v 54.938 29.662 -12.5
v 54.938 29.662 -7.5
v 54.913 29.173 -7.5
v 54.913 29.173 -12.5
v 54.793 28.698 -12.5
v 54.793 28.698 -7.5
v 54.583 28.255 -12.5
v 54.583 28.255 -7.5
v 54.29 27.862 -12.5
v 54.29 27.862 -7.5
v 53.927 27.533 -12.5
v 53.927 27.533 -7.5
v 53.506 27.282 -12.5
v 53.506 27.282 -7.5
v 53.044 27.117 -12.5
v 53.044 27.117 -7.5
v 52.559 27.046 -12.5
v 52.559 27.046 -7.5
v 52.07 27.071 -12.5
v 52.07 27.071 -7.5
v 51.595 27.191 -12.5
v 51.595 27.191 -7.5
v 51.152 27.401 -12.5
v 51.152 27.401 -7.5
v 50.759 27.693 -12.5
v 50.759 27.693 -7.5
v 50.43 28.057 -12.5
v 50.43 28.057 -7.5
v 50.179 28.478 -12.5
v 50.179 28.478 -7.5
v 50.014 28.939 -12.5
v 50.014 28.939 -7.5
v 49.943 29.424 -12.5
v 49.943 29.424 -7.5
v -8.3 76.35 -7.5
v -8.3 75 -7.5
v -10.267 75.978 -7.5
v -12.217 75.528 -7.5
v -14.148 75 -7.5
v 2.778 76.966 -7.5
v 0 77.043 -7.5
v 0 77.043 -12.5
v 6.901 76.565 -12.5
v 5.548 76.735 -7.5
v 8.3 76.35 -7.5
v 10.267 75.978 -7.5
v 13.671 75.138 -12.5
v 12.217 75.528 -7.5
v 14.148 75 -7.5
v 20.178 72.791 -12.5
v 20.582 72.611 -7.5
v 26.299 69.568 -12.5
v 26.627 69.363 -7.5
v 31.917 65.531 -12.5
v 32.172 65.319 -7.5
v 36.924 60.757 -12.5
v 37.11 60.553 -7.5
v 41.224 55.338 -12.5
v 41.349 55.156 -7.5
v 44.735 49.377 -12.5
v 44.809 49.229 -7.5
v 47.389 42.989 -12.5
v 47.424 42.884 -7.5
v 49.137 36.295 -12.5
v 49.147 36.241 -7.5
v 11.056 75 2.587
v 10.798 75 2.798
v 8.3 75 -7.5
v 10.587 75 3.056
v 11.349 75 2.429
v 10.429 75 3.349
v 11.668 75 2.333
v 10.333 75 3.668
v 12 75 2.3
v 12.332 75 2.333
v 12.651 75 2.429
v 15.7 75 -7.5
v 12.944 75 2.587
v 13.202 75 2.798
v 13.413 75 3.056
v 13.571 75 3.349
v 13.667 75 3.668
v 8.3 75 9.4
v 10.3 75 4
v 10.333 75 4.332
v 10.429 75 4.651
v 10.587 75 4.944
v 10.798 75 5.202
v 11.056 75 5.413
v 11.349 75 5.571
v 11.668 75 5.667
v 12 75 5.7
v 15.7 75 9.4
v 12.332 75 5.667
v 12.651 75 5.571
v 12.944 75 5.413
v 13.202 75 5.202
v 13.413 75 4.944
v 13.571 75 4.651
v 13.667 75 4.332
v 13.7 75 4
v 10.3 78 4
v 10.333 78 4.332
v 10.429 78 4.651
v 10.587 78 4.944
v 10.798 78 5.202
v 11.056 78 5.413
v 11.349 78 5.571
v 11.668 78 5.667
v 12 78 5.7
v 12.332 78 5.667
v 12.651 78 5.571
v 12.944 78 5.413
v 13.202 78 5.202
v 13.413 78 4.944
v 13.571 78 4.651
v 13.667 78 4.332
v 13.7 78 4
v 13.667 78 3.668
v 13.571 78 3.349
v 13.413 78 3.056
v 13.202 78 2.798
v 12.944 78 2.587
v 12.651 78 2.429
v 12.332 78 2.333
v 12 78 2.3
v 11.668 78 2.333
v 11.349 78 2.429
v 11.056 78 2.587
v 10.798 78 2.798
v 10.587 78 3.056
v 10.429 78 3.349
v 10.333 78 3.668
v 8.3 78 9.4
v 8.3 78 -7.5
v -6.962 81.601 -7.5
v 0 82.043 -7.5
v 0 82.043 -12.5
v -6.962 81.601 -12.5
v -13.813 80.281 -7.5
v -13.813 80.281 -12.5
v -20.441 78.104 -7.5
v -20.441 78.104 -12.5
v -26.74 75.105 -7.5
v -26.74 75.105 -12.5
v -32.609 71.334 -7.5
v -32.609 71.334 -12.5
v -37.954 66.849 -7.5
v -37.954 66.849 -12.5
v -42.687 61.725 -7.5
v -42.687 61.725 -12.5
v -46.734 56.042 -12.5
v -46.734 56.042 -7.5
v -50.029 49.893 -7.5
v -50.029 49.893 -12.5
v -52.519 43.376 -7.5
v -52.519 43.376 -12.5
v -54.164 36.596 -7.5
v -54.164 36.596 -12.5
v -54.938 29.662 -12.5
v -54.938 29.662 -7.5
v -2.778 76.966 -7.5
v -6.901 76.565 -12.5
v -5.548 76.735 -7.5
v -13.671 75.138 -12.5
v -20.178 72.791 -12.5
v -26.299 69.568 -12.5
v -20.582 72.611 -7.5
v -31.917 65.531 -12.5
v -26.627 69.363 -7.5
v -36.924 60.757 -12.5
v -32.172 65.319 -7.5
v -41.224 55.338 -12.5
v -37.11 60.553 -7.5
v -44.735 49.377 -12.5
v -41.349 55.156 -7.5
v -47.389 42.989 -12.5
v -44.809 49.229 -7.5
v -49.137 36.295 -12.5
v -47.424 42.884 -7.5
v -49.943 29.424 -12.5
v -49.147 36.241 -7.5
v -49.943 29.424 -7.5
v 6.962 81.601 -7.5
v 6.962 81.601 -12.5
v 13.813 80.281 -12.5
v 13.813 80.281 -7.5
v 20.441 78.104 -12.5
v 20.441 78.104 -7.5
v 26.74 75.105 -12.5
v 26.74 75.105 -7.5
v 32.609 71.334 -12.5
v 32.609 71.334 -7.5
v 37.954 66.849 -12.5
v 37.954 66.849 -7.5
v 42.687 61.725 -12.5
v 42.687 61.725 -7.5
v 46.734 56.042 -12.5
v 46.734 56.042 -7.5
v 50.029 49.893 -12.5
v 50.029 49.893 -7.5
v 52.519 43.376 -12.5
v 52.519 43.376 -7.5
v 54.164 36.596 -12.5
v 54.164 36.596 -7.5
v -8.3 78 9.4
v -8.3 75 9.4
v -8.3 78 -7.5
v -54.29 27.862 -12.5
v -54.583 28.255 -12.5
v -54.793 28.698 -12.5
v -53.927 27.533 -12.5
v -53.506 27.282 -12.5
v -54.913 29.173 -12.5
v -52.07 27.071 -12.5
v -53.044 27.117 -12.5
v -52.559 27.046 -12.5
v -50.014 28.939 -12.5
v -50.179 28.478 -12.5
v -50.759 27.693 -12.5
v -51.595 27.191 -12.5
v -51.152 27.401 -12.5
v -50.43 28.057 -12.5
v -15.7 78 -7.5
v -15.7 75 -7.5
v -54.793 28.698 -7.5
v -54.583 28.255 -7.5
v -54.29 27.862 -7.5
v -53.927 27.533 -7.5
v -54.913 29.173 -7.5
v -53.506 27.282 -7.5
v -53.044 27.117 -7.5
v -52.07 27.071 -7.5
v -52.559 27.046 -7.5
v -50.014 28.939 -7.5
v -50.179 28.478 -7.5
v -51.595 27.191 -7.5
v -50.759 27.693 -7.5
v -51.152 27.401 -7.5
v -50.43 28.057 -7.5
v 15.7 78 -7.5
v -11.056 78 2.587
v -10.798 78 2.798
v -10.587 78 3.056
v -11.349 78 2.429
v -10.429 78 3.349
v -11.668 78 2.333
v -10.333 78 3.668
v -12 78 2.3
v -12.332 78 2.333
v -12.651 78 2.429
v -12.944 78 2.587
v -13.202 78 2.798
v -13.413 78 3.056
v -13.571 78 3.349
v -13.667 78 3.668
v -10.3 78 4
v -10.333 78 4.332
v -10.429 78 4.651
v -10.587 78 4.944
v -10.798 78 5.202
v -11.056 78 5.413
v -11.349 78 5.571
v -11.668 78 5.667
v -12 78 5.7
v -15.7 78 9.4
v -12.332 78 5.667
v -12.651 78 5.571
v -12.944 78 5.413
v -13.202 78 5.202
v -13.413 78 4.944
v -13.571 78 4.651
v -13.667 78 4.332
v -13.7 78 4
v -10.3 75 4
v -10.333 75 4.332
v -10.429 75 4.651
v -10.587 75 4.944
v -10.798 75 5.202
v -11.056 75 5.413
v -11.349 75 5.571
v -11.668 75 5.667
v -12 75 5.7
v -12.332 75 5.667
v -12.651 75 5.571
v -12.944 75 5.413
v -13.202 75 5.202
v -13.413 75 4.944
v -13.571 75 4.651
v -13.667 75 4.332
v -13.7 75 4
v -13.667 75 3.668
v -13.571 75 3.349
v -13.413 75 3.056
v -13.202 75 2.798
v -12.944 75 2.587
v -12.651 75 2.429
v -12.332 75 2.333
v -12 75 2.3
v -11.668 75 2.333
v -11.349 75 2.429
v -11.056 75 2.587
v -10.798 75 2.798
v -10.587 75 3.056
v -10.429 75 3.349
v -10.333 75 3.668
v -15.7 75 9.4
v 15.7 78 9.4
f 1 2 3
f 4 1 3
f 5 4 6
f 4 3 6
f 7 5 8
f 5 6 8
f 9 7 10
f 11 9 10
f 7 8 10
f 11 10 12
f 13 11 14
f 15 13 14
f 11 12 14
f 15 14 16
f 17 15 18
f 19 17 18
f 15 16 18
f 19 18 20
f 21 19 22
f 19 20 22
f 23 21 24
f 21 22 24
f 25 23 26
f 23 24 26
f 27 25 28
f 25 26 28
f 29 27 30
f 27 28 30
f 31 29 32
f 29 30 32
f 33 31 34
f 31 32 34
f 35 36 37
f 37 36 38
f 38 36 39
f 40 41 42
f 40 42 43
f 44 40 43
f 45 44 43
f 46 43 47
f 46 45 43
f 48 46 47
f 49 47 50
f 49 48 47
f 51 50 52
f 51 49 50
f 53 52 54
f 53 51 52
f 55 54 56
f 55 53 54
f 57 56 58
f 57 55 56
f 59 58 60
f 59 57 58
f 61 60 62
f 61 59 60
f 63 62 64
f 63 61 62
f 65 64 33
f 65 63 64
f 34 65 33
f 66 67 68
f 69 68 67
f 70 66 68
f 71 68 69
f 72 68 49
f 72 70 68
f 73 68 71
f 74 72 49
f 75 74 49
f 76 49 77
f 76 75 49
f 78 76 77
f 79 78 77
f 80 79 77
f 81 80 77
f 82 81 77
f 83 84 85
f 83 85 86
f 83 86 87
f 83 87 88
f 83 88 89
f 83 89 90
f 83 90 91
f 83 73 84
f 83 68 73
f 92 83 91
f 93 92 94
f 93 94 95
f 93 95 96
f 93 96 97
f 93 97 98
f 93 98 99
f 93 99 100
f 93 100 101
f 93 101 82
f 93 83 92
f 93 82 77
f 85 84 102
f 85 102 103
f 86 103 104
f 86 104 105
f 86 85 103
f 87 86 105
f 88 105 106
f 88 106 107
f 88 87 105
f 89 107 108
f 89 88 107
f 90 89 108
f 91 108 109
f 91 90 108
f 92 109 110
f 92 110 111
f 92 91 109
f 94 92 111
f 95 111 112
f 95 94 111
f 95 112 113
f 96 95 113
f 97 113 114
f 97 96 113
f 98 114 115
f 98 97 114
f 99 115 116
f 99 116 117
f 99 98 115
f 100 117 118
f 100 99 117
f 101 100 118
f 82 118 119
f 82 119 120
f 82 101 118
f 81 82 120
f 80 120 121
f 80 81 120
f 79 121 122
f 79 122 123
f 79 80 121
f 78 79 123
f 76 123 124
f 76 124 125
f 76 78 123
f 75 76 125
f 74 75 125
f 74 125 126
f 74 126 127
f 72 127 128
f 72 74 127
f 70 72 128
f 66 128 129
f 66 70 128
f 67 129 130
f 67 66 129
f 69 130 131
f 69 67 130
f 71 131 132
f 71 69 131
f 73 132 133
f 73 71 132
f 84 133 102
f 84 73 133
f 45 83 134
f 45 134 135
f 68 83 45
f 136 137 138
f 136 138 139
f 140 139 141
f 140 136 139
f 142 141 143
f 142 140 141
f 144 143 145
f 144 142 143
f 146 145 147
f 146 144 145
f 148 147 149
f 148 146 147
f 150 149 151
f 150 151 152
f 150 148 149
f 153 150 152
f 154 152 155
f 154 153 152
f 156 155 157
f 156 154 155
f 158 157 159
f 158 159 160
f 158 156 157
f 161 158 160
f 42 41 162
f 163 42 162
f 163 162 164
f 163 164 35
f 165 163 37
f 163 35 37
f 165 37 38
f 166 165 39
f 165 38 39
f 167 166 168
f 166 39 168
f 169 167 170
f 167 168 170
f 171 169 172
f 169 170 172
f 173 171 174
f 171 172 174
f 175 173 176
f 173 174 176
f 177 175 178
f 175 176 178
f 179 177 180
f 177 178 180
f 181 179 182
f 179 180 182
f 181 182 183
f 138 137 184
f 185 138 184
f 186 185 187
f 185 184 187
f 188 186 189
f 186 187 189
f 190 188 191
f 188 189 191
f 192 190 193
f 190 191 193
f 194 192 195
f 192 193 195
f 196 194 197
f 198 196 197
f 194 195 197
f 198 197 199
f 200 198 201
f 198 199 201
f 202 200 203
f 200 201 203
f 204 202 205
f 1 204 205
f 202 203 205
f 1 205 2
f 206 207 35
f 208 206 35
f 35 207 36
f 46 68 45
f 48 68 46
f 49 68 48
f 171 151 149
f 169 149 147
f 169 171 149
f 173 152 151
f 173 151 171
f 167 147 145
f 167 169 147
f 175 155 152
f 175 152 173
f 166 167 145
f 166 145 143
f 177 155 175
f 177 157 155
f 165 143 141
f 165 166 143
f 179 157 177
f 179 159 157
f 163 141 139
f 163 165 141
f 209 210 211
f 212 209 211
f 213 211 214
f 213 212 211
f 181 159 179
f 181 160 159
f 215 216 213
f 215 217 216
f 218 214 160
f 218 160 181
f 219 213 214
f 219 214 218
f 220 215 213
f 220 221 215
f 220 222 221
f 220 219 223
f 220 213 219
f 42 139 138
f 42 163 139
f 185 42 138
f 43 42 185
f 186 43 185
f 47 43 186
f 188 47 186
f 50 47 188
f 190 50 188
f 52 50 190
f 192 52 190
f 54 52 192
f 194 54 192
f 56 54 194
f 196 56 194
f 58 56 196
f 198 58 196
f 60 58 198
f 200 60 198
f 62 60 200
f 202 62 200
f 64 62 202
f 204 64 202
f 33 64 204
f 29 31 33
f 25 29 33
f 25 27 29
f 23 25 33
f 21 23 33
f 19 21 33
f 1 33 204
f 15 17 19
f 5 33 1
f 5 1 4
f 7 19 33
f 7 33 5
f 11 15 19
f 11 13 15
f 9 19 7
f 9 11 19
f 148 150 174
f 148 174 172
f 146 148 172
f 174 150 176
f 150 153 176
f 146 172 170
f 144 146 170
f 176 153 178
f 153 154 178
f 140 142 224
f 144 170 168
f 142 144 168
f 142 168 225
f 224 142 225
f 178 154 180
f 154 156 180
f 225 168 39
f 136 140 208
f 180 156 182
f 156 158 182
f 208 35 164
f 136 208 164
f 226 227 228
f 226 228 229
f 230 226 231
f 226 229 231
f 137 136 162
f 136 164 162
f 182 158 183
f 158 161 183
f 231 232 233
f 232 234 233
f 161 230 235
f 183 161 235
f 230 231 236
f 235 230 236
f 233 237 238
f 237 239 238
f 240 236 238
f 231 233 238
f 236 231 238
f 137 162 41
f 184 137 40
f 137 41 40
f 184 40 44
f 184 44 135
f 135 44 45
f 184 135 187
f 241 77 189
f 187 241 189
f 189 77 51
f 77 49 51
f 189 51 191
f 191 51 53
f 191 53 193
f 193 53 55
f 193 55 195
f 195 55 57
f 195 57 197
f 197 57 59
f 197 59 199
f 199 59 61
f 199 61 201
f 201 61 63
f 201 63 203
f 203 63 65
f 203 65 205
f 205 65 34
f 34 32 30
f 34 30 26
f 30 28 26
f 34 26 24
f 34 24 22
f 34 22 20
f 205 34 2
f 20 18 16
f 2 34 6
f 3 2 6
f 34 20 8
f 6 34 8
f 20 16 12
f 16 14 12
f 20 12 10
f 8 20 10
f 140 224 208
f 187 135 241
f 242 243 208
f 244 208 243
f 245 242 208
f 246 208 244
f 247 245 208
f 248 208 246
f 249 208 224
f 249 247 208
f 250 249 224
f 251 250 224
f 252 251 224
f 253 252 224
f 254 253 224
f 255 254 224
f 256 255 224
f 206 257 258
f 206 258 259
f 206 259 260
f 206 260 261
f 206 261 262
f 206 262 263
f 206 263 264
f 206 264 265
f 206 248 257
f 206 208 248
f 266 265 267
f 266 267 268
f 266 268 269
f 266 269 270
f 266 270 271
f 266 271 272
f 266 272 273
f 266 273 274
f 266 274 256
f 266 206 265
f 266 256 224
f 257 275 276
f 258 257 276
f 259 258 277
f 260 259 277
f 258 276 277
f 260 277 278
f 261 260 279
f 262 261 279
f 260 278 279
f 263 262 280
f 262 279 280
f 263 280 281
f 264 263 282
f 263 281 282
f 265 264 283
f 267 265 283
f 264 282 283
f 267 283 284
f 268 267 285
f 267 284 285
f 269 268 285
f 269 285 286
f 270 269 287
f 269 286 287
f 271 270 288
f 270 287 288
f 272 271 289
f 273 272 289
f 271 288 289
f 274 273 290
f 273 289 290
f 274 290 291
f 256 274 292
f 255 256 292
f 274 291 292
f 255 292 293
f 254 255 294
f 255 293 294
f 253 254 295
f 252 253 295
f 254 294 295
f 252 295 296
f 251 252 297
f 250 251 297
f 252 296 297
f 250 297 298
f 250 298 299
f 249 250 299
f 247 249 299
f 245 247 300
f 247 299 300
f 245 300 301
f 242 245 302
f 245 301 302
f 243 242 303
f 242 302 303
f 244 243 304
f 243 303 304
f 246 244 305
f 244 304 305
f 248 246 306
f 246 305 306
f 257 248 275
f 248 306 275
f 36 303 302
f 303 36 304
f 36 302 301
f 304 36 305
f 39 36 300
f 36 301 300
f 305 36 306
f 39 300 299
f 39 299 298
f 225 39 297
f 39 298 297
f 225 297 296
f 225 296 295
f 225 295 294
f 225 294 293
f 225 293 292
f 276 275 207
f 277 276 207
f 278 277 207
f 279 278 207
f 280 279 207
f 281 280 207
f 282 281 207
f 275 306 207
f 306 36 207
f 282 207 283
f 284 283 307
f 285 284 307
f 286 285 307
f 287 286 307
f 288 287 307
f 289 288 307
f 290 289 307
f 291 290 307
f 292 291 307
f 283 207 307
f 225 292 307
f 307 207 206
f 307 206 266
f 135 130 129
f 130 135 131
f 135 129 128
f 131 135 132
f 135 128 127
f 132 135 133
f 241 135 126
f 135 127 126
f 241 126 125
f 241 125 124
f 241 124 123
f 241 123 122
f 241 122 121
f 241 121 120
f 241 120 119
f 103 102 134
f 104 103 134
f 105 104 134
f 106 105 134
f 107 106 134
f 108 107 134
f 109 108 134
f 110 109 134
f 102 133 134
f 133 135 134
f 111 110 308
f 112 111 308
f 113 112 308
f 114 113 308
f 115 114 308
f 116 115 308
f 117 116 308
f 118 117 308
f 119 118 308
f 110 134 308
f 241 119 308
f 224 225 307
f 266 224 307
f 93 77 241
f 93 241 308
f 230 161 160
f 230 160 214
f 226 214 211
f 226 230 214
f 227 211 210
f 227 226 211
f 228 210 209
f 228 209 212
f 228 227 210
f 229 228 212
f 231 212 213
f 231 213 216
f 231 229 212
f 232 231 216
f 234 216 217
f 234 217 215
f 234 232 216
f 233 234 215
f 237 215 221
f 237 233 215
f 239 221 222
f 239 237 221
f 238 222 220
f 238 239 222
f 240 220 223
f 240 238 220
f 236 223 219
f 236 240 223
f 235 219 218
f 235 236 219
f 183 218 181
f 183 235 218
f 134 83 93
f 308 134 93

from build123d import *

# Parameters (mm, degrees)
SKETCH023_R  = 1.7
PAD012_DEPTH = 3
PAD013_DEPTH = 5


with BuildPart() as part:
    # Sketch023 → Pad012 (new body)
    with BuildSketch(Plane(origin=(0, 75, 0), x_dir=(-1, 0, 0), z_dir=(0, 1, 0))):
        Polygon((-15.7, -7.5), (-15.7, 9.4), (-12, 9.4), (-8.3, 9.4), (-8.3, -7.5), align=None)
        with Locations((-12, 4)):
            Circle(SKETCH023_R, mode=Mode.SUBTRACT)
    pad012 = extrude(amount=PAD012_DEPTH)

    # Sketch025 (on Face5 of Pad012) → Pad013 (join)
    with BuildSketch(Plane(origin=(0, 0, -7.5), x_dir=(1, 0, 0), z_dir=(0, 0, -1))):
        with BuildLine():
            ThreePointArc((0, -77.043425), (34.5032756474, -63.2307704346), (49.943278179, -29.4243837841))
            ThreePointArc((54.9376070845, -29.6624568488), (52.5594789409, -27.0462605473), (49.943278179, -29.4243837841))
            ThreePointArc((0, -82.043425), (37.9536114771, -66.8494970976), (54.9376070845, -29.6624568488))
            Line((0, -77.043425), (0, -82.043425))
        make_face()
    pad013 = extrude(amount=PAD013_DEPTH)

    # Mirrored007: Pad013, Pad012 across Sketch025 V_Axis
    add(pad013.mirror(Plane(origin=(0, 0, -7.5), x_dir=(0, 0, -1), z_dir=(1, 0, 0))))
    add(pad012.mirror(Plane(origin=(0, 0, -7.5), x_dir=(0, 0, -1), z_dir=(1, 0, 0))))


solid = part.part
